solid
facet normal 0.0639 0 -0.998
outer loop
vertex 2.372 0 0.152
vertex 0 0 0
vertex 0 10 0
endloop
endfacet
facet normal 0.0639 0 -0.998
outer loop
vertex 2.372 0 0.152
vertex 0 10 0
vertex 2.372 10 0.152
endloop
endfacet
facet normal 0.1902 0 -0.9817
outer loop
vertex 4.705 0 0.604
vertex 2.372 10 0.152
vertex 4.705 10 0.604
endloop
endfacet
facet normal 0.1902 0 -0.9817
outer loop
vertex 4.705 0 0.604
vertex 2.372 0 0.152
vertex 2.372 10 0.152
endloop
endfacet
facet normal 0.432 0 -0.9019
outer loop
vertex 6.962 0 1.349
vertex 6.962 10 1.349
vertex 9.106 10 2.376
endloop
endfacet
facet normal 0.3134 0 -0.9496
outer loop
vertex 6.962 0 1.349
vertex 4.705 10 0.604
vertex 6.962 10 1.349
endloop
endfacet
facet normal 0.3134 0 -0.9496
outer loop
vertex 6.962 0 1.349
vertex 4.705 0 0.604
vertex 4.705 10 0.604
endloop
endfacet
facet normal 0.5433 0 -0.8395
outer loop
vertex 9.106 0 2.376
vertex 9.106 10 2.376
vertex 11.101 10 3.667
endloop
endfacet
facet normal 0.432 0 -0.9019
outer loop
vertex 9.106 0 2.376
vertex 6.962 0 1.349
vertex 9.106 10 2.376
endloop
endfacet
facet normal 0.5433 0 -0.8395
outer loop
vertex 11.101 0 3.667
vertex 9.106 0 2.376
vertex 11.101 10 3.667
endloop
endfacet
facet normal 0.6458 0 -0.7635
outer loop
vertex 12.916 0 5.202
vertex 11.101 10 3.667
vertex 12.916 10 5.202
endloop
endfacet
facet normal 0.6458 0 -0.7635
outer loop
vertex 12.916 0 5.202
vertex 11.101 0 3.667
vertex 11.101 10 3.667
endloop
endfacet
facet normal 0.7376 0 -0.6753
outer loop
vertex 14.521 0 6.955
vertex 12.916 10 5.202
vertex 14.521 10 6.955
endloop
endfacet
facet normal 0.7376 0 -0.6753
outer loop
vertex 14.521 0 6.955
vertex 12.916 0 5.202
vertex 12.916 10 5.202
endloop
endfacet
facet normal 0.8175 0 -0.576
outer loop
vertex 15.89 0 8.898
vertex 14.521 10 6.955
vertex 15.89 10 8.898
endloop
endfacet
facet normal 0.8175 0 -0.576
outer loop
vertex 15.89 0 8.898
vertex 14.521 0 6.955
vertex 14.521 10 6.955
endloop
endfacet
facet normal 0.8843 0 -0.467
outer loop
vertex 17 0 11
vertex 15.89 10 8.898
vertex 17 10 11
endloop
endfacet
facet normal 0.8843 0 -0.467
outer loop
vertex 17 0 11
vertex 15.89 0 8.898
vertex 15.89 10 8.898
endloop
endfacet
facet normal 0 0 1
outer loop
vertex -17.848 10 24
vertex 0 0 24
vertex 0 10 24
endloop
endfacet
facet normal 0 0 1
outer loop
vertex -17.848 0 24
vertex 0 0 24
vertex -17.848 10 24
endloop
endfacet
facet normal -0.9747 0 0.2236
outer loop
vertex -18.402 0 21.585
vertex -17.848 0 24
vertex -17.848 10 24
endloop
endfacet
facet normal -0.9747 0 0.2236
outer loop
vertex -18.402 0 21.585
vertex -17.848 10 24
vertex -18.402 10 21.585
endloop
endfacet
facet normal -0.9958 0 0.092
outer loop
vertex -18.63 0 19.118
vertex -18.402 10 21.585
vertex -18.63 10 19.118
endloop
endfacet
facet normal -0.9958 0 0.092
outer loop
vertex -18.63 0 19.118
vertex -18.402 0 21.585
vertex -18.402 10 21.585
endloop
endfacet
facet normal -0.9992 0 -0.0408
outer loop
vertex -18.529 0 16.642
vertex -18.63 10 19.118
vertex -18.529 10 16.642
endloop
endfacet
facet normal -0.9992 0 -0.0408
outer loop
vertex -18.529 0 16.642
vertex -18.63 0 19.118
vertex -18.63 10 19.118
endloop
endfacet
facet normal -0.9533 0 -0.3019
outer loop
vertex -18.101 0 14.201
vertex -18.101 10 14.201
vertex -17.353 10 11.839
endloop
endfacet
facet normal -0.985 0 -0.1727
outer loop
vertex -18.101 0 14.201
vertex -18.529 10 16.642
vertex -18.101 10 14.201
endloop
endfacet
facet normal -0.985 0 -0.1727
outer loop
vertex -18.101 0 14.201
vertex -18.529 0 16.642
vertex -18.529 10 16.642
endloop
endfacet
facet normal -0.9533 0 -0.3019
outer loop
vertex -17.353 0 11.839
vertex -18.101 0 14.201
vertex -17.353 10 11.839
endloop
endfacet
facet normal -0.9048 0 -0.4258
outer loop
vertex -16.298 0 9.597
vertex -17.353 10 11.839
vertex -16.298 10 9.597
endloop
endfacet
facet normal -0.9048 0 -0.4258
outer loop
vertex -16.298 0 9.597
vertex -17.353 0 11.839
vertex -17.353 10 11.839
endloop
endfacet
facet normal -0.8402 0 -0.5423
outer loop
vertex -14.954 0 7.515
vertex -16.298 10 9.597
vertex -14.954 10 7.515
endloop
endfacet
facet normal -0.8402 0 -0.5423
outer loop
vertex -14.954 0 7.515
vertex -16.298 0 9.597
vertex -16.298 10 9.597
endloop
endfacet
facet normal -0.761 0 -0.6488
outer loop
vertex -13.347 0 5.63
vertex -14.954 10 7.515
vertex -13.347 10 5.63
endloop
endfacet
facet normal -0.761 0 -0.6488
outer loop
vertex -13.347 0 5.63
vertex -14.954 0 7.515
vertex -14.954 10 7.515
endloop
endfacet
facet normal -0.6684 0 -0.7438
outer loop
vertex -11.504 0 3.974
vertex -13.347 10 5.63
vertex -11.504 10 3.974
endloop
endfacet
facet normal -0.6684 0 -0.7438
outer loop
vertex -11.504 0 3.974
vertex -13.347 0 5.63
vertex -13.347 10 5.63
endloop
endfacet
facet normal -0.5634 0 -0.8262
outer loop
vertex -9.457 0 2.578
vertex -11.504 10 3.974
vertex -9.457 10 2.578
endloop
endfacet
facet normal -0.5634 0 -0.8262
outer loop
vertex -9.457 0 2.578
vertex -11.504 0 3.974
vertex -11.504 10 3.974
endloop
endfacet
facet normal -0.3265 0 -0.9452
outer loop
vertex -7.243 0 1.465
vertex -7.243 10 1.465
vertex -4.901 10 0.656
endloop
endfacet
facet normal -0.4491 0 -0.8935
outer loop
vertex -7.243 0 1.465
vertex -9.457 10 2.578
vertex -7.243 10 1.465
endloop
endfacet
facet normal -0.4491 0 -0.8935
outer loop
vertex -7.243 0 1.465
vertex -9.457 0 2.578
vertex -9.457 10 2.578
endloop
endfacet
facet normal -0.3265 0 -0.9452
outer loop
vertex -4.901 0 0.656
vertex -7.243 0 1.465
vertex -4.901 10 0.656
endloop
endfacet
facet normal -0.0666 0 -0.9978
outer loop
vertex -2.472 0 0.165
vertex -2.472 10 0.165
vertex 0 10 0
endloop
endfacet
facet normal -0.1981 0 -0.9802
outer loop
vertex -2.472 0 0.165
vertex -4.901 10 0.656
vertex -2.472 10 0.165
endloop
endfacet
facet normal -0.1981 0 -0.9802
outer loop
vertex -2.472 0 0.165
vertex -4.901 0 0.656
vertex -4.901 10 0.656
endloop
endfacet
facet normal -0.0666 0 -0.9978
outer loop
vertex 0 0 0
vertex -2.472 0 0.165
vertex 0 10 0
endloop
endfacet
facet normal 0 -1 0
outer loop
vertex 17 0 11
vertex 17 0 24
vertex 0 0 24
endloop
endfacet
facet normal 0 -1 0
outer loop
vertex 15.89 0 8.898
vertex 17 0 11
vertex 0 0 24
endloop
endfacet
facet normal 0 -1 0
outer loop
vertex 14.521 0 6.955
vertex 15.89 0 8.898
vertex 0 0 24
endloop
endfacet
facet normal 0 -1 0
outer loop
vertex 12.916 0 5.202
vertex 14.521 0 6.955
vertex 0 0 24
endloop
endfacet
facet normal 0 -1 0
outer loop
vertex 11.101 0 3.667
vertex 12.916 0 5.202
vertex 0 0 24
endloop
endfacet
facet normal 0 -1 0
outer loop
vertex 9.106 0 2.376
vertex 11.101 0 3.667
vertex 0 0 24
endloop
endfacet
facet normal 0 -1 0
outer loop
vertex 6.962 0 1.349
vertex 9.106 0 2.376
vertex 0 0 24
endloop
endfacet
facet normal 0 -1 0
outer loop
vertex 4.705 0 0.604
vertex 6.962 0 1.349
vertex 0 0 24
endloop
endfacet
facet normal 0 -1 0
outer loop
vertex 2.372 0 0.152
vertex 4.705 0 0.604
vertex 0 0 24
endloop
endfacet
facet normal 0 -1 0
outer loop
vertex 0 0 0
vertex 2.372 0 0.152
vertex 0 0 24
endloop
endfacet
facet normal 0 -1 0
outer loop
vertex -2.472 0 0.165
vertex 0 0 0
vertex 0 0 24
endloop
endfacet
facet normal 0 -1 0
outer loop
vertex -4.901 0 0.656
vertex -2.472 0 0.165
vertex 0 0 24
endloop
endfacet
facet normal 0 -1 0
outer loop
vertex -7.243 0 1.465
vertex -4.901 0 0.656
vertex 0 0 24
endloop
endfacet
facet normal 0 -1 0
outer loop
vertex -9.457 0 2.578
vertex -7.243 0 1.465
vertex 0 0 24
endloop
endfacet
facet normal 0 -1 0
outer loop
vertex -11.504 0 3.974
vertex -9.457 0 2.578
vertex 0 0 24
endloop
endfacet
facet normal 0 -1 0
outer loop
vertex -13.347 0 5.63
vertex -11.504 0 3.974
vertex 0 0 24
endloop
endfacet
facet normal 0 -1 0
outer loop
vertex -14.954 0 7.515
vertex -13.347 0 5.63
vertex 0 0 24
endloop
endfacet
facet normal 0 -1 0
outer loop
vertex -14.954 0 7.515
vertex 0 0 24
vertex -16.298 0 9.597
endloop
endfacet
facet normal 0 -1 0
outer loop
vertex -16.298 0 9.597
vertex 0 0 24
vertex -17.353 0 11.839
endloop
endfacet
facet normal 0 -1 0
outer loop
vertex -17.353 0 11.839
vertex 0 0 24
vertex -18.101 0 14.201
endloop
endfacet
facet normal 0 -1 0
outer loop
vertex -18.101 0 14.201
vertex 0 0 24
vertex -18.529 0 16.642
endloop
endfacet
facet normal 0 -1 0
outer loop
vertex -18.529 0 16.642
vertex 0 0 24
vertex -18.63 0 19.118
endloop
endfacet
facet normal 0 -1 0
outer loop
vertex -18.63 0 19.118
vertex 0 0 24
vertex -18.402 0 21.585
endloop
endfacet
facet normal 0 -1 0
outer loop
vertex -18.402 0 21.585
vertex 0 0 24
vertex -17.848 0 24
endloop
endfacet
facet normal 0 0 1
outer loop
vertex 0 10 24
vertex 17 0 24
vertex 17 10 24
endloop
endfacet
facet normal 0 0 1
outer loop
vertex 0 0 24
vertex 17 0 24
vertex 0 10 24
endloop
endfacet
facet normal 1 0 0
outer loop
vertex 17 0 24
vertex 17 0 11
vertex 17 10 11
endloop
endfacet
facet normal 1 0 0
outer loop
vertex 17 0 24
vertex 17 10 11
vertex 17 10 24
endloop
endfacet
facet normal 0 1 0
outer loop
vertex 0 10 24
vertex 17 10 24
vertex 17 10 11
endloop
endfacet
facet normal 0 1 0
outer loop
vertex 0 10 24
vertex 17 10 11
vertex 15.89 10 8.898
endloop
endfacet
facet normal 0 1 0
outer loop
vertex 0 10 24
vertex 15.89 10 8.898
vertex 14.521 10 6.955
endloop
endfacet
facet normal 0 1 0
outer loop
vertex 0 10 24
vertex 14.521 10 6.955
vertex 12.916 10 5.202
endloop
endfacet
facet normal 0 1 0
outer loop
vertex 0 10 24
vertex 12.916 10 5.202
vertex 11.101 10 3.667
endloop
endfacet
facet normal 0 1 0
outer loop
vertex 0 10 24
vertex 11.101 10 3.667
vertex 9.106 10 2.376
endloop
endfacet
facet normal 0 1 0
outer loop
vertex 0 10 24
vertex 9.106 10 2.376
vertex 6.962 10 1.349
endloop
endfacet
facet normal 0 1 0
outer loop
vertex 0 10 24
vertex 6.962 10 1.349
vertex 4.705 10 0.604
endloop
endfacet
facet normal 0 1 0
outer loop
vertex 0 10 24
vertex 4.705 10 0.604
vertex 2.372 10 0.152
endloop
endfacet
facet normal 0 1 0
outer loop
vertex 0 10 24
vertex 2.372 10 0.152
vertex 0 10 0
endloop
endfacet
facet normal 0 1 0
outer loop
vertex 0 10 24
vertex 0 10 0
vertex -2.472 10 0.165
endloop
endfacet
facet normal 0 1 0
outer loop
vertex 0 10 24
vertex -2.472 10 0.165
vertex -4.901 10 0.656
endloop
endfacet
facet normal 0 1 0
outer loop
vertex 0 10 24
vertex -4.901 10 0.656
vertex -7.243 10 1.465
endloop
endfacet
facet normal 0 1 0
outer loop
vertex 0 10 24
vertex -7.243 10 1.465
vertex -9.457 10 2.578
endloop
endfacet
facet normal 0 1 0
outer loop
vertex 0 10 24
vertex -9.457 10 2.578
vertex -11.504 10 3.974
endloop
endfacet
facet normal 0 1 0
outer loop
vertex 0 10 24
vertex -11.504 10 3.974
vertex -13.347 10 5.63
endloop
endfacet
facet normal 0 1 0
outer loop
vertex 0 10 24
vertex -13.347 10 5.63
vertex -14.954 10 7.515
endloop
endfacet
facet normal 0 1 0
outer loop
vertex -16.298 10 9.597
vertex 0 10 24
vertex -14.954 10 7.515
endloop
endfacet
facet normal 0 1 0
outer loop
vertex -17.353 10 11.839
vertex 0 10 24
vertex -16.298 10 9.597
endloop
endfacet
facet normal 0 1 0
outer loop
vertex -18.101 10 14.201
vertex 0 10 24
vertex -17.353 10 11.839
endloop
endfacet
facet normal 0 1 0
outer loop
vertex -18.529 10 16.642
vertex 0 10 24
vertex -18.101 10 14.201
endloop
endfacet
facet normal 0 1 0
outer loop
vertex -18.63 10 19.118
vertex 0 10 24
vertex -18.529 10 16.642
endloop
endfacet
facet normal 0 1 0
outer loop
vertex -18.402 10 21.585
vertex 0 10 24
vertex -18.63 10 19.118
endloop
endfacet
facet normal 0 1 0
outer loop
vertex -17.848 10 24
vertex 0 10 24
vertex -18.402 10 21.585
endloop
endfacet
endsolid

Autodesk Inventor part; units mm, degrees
ref_plane "YZ Plane" through (0, 0, 0) normal (1, 0, 0) x (0, 1, 0)
ref_plane "XZ Plane" through (0, 0, 0) normal (0, 1, 0) x (-1, 0, 0)
ref_plane "XY Plane" through (0, 0, 0) normal (0, 0, 1) x (1, 0, 0)
sketch "Sketch2" plane through (0, 0, 0) normal (0, 1, 0) x (-1, 0, 0)
  line L0 (-27.2, 0) -> (20.4, 0) projected
  line L1 (0, 8.6664) -> (0, 28.1819) projected
  line L2 (-17, 11) -> (-17, 24)
  line L3 (-17, 24) -> (17.8478, 24)
  arc A0 (-17, 11) -> (17.8478, 24) centre (0, 18.6364) ccw
  dimension "d1" = 24
  dimension "d2" = 18.6364
  dimension "d3" = 17
  dimension "d4" = 18.6364
extrude "Extrusion1" add sketch "Sketch2" along normal blind 10
